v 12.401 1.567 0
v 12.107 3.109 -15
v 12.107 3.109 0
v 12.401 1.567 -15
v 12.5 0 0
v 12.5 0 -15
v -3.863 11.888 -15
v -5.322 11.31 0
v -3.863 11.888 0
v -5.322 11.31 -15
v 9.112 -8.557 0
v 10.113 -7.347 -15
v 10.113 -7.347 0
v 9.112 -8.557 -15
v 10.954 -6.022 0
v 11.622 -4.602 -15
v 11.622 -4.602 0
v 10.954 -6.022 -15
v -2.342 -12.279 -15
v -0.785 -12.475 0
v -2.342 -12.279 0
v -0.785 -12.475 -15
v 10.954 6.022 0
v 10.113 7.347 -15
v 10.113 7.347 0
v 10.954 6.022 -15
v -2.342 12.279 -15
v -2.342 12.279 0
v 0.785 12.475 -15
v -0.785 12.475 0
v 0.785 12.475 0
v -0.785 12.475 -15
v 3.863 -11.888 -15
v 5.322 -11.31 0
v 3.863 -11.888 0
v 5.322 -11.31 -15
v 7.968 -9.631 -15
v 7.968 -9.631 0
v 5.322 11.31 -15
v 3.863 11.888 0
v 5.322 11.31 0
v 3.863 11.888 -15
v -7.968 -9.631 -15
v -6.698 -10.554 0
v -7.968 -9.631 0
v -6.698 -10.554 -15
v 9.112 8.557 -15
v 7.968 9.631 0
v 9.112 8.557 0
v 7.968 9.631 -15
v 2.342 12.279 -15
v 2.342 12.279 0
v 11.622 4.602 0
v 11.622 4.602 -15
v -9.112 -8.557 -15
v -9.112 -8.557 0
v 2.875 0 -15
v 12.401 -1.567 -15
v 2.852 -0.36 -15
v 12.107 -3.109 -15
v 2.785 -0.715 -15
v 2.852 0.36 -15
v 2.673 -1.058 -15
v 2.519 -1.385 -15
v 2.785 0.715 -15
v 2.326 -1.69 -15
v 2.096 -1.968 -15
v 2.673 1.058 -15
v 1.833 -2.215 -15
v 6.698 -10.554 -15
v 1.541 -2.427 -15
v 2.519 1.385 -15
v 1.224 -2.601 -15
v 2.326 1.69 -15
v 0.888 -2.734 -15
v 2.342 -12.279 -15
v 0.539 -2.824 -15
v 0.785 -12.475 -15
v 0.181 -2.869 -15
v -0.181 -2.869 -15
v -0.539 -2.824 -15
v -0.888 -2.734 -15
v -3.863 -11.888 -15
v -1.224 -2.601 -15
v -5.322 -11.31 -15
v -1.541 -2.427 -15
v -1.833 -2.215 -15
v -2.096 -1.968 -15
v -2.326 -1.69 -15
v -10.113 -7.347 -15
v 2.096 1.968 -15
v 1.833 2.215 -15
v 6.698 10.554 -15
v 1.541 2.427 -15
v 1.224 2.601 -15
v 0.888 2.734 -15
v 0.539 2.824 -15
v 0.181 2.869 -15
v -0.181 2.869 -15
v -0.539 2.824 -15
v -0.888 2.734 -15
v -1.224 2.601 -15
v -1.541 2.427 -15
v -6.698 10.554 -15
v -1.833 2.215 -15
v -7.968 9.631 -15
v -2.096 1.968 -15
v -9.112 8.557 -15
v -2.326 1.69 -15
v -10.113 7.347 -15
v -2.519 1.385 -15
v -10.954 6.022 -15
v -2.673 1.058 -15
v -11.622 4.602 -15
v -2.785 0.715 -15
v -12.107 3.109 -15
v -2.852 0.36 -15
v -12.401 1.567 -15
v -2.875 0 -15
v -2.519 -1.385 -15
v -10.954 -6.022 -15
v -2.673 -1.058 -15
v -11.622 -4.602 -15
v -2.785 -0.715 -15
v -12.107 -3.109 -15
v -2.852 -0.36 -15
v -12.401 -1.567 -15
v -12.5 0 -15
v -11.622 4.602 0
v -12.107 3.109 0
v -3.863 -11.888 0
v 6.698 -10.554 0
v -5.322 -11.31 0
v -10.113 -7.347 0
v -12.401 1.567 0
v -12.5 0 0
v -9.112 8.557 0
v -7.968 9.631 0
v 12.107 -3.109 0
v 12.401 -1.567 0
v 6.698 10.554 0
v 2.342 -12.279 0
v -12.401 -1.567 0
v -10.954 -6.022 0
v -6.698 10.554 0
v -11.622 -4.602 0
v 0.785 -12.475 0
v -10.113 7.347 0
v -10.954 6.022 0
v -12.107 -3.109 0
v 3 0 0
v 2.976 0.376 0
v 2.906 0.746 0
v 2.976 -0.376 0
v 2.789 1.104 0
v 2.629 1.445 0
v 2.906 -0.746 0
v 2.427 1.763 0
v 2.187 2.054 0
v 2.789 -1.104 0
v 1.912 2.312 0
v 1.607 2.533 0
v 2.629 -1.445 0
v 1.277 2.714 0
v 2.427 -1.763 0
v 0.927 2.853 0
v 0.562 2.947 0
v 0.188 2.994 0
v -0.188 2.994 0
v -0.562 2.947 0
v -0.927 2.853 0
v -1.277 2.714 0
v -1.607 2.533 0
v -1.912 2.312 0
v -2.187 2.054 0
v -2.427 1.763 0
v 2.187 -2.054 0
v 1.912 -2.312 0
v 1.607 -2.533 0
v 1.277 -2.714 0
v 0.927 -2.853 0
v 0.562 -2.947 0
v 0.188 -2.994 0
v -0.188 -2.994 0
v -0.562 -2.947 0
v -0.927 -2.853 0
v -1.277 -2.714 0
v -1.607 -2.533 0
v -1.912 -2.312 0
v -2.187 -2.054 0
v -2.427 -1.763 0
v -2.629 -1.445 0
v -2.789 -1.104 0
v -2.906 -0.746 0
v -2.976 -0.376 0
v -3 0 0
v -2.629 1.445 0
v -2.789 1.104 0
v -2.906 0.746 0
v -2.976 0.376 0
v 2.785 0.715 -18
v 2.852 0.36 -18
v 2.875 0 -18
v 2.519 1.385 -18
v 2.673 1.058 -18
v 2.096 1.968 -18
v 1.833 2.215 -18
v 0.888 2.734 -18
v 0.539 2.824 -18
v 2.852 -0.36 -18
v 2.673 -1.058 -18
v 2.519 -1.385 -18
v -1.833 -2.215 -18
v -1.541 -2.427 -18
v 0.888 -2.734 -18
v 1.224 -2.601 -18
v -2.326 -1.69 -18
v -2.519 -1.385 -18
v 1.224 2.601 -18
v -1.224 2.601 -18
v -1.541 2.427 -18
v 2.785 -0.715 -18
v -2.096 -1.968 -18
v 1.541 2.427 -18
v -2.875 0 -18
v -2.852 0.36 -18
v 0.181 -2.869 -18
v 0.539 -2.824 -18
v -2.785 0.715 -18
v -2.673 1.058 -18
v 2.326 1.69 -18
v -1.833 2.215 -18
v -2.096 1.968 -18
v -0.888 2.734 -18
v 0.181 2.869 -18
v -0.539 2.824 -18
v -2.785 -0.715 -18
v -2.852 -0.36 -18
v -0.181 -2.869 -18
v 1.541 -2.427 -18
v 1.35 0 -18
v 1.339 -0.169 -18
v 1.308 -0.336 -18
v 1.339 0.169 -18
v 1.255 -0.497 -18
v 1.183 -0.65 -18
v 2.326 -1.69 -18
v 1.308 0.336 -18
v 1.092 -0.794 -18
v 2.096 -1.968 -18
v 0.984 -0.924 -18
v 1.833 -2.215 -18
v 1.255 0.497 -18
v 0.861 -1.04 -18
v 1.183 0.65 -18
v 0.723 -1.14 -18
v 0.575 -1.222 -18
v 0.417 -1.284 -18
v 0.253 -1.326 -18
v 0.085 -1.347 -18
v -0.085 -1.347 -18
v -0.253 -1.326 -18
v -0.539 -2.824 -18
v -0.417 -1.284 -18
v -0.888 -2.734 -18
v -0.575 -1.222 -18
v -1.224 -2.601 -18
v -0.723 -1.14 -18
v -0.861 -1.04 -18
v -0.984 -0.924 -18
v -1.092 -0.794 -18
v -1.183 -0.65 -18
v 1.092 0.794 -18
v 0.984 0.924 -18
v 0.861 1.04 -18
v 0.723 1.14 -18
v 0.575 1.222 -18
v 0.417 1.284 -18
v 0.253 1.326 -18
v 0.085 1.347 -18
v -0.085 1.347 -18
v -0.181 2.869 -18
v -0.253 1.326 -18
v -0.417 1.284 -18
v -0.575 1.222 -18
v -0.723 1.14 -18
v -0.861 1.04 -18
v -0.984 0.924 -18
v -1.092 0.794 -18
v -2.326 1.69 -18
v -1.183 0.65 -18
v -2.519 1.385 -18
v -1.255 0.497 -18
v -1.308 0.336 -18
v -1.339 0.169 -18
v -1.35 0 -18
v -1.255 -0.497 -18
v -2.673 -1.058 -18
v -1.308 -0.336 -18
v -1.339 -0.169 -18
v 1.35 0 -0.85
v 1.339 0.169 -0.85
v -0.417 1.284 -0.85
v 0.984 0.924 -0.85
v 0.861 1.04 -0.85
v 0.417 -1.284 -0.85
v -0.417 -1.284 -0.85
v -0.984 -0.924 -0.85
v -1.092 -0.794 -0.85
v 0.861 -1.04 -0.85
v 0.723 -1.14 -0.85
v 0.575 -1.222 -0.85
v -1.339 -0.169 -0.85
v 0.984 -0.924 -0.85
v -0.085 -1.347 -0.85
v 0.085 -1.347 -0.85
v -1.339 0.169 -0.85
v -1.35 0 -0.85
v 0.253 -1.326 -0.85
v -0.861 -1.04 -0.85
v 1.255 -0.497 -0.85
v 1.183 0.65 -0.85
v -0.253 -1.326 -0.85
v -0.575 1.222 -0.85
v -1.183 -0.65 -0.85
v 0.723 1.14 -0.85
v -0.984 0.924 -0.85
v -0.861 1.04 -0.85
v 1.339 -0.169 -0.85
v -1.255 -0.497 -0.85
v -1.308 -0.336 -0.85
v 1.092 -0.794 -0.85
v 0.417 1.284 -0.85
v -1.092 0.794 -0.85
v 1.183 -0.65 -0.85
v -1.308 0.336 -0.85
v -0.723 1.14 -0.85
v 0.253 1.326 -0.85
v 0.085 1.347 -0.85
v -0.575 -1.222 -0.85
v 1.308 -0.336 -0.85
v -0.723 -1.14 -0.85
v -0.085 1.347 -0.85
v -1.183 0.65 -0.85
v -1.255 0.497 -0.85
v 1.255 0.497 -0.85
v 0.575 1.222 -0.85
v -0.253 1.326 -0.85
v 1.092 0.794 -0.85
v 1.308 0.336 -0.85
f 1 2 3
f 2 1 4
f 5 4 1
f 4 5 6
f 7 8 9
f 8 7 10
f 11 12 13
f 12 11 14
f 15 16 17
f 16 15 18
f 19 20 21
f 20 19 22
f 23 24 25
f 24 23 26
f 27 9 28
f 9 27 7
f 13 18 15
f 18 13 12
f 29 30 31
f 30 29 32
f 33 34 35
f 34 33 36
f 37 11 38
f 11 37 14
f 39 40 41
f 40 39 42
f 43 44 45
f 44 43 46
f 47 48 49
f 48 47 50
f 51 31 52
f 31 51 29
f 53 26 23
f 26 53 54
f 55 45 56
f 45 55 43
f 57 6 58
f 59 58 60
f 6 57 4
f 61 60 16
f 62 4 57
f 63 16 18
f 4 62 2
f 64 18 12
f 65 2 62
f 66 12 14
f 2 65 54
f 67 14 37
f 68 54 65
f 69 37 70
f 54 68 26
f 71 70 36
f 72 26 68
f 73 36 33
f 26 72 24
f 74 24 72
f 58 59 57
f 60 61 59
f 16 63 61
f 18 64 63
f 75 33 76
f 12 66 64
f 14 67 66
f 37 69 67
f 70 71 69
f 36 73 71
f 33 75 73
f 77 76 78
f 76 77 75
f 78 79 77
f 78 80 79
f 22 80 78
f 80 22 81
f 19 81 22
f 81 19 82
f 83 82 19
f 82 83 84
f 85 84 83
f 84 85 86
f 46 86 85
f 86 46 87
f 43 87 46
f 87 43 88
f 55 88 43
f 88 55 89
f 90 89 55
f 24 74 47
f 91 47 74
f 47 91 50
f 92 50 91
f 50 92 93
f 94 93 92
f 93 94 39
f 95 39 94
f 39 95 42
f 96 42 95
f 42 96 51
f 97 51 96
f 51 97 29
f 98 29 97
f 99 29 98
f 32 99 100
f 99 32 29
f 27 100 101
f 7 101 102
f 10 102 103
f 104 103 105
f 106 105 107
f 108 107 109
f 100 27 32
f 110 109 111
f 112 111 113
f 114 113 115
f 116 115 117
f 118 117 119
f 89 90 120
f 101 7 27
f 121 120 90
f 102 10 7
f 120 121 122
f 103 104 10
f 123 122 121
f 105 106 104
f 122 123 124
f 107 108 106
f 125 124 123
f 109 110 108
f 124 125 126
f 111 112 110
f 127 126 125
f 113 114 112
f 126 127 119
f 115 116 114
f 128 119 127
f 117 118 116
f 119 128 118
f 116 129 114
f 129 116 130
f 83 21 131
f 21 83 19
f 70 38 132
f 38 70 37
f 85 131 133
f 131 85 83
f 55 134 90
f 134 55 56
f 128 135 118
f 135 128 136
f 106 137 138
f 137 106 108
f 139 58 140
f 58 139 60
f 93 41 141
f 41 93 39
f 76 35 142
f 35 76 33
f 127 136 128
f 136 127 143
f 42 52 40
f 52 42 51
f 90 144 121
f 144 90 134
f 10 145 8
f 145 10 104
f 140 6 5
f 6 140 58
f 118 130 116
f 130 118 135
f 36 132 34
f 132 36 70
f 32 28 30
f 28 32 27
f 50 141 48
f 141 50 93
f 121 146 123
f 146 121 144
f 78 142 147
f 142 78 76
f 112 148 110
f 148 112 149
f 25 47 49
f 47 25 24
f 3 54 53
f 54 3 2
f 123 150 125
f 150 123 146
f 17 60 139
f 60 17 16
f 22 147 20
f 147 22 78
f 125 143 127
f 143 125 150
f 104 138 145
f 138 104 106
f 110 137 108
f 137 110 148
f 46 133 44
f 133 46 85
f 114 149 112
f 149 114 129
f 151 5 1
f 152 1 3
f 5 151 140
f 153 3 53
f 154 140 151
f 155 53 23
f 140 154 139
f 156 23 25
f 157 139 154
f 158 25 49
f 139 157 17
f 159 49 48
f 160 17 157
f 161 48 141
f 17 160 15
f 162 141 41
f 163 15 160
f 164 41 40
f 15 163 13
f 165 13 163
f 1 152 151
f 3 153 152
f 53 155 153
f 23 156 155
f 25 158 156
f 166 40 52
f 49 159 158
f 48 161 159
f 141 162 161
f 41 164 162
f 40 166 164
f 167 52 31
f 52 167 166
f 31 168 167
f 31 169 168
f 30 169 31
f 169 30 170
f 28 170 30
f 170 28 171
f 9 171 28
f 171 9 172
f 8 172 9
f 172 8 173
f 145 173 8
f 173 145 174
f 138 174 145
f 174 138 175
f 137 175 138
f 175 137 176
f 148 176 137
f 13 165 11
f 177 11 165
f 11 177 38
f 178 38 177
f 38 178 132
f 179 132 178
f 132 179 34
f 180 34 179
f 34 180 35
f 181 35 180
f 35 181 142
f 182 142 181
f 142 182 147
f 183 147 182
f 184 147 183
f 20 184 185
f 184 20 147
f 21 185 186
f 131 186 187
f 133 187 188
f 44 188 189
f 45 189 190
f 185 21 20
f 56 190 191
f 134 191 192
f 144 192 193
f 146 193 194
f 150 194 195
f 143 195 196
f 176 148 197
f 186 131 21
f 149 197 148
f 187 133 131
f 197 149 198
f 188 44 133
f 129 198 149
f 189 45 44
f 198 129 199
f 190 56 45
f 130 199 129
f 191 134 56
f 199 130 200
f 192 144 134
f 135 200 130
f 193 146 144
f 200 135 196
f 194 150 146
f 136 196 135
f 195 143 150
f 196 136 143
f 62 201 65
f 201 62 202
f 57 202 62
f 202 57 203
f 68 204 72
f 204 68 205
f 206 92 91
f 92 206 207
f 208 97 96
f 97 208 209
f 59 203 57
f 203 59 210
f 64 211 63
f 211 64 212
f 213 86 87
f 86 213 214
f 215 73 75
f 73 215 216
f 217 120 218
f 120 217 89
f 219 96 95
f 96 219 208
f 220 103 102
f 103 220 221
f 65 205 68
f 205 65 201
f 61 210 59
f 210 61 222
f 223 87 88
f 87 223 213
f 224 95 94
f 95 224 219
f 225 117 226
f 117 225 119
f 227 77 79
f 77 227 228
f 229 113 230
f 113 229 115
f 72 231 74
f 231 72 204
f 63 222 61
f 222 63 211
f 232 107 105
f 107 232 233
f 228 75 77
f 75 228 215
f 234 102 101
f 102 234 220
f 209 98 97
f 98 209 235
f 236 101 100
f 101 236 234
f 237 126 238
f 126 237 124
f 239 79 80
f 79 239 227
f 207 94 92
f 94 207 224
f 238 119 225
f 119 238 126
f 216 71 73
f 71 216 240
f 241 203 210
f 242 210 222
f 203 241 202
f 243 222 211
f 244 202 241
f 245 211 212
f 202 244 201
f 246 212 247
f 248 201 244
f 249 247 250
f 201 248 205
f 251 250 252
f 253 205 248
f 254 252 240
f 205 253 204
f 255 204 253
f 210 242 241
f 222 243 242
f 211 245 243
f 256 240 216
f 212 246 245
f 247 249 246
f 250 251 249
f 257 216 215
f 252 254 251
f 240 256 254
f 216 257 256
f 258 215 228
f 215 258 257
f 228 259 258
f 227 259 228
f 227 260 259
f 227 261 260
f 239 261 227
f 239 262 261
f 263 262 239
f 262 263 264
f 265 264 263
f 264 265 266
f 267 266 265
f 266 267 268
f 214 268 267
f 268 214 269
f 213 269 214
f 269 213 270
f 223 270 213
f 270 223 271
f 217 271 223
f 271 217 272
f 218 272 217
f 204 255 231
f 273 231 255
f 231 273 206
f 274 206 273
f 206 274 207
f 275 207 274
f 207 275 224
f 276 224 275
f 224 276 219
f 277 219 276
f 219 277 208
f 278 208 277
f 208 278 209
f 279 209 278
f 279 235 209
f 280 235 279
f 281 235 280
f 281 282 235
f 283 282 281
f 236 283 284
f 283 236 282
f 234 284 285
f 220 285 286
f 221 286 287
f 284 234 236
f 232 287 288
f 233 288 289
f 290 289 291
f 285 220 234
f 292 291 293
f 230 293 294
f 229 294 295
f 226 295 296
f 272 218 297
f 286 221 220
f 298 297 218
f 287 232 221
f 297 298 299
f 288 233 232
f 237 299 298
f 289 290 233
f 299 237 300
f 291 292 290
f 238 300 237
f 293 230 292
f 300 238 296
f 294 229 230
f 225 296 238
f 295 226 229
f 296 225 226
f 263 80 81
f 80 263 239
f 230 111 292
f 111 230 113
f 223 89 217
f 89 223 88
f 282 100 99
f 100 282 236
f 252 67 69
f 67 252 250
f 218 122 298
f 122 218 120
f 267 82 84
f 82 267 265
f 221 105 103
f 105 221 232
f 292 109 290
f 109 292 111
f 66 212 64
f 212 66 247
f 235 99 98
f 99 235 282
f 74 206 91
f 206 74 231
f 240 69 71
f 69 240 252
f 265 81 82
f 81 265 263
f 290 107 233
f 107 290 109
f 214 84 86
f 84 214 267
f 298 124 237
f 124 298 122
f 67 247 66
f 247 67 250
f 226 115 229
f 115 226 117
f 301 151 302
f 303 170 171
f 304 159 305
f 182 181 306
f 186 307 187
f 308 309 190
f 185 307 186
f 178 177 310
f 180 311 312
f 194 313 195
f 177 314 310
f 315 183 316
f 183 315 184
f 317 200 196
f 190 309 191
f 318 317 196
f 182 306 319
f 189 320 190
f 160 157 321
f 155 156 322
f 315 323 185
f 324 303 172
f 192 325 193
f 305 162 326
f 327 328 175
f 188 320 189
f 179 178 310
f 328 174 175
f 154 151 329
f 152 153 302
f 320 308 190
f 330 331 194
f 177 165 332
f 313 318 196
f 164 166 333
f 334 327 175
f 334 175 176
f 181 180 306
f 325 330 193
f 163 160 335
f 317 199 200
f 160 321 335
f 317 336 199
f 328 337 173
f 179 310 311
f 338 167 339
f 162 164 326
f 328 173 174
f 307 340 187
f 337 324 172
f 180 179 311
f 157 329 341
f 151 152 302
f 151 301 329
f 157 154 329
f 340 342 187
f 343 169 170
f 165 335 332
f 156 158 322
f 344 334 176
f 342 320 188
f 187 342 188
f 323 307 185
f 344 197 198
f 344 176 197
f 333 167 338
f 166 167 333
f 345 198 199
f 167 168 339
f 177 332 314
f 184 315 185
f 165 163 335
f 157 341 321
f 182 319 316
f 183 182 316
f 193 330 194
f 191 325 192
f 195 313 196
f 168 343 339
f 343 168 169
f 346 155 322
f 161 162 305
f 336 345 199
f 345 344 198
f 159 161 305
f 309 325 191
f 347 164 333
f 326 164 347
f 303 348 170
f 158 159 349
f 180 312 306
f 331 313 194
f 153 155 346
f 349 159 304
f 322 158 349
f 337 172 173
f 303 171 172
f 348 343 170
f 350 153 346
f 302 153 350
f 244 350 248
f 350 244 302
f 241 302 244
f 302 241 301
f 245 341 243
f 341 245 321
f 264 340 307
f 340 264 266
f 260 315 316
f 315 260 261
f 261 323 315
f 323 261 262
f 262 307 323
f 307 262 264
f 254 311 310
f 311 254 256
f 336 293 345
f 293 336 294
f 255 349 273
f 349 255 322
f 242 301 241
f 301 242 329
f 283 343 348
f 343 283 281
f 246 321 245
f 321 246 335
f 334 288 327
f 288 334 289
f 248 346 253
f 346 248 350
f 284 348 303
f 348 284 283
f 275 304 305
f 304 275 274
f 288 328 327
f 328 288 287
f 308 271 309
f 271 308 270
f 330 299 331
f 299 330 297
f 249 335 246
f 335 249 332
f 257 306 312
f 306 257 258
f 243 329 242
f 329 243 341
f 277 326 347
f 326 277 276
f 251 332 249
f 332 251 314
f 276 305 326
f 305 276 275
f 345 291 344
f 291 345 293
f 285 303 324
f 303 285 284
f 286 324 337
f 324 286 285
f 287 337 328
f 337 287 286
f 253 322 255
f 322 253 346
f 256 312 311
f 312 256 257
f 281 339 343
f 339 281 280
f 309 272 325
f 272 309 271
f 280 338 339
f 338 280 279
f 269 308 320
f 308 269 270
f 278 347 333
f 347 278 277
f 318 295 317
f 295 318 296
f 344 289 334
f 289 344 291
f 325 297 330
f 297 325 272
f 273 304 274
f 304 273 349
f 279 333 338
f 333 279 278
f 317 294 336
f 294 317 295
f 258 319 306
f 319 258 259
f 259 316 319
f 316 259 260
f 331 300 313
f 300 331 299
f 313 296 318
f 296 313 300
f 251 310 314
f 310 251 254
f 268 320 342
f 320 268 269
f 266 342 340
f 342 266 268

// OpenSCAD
$fn = 50;

difference() {
	union() {
		translate(v = [0, 0, -15.0]) {
			cylinder(h = 15, r = 12.5);
		}
		#translate(v = [0, 0, -18.0]) {
			cylinder(h = 18, r = 2.875);
		}
	}
	union() {
		translate(v = [0, 0, 0]) {
			rotate(a = [0, 0, 0]) {
				difference() {
					union() {
						translate(v = [0, 0, -18.0]) {
							cylinder(h = 18, r = 1.0);
						}
						translate(v = [0, 0, -0.85]) {
							cylinder(h = 0.85, r1 = 1.35, r2 = 3.0);
						}
						translate(v = [0, 0, -18.0]) {
							cylinder(h = 18, r = 1.35);
						}
						translate(v = [0, 0, -18.0]) {
							cylinder(h = 18, r = 1.0);
						}
					}
					union();
				}
			}
		}
	}
}
